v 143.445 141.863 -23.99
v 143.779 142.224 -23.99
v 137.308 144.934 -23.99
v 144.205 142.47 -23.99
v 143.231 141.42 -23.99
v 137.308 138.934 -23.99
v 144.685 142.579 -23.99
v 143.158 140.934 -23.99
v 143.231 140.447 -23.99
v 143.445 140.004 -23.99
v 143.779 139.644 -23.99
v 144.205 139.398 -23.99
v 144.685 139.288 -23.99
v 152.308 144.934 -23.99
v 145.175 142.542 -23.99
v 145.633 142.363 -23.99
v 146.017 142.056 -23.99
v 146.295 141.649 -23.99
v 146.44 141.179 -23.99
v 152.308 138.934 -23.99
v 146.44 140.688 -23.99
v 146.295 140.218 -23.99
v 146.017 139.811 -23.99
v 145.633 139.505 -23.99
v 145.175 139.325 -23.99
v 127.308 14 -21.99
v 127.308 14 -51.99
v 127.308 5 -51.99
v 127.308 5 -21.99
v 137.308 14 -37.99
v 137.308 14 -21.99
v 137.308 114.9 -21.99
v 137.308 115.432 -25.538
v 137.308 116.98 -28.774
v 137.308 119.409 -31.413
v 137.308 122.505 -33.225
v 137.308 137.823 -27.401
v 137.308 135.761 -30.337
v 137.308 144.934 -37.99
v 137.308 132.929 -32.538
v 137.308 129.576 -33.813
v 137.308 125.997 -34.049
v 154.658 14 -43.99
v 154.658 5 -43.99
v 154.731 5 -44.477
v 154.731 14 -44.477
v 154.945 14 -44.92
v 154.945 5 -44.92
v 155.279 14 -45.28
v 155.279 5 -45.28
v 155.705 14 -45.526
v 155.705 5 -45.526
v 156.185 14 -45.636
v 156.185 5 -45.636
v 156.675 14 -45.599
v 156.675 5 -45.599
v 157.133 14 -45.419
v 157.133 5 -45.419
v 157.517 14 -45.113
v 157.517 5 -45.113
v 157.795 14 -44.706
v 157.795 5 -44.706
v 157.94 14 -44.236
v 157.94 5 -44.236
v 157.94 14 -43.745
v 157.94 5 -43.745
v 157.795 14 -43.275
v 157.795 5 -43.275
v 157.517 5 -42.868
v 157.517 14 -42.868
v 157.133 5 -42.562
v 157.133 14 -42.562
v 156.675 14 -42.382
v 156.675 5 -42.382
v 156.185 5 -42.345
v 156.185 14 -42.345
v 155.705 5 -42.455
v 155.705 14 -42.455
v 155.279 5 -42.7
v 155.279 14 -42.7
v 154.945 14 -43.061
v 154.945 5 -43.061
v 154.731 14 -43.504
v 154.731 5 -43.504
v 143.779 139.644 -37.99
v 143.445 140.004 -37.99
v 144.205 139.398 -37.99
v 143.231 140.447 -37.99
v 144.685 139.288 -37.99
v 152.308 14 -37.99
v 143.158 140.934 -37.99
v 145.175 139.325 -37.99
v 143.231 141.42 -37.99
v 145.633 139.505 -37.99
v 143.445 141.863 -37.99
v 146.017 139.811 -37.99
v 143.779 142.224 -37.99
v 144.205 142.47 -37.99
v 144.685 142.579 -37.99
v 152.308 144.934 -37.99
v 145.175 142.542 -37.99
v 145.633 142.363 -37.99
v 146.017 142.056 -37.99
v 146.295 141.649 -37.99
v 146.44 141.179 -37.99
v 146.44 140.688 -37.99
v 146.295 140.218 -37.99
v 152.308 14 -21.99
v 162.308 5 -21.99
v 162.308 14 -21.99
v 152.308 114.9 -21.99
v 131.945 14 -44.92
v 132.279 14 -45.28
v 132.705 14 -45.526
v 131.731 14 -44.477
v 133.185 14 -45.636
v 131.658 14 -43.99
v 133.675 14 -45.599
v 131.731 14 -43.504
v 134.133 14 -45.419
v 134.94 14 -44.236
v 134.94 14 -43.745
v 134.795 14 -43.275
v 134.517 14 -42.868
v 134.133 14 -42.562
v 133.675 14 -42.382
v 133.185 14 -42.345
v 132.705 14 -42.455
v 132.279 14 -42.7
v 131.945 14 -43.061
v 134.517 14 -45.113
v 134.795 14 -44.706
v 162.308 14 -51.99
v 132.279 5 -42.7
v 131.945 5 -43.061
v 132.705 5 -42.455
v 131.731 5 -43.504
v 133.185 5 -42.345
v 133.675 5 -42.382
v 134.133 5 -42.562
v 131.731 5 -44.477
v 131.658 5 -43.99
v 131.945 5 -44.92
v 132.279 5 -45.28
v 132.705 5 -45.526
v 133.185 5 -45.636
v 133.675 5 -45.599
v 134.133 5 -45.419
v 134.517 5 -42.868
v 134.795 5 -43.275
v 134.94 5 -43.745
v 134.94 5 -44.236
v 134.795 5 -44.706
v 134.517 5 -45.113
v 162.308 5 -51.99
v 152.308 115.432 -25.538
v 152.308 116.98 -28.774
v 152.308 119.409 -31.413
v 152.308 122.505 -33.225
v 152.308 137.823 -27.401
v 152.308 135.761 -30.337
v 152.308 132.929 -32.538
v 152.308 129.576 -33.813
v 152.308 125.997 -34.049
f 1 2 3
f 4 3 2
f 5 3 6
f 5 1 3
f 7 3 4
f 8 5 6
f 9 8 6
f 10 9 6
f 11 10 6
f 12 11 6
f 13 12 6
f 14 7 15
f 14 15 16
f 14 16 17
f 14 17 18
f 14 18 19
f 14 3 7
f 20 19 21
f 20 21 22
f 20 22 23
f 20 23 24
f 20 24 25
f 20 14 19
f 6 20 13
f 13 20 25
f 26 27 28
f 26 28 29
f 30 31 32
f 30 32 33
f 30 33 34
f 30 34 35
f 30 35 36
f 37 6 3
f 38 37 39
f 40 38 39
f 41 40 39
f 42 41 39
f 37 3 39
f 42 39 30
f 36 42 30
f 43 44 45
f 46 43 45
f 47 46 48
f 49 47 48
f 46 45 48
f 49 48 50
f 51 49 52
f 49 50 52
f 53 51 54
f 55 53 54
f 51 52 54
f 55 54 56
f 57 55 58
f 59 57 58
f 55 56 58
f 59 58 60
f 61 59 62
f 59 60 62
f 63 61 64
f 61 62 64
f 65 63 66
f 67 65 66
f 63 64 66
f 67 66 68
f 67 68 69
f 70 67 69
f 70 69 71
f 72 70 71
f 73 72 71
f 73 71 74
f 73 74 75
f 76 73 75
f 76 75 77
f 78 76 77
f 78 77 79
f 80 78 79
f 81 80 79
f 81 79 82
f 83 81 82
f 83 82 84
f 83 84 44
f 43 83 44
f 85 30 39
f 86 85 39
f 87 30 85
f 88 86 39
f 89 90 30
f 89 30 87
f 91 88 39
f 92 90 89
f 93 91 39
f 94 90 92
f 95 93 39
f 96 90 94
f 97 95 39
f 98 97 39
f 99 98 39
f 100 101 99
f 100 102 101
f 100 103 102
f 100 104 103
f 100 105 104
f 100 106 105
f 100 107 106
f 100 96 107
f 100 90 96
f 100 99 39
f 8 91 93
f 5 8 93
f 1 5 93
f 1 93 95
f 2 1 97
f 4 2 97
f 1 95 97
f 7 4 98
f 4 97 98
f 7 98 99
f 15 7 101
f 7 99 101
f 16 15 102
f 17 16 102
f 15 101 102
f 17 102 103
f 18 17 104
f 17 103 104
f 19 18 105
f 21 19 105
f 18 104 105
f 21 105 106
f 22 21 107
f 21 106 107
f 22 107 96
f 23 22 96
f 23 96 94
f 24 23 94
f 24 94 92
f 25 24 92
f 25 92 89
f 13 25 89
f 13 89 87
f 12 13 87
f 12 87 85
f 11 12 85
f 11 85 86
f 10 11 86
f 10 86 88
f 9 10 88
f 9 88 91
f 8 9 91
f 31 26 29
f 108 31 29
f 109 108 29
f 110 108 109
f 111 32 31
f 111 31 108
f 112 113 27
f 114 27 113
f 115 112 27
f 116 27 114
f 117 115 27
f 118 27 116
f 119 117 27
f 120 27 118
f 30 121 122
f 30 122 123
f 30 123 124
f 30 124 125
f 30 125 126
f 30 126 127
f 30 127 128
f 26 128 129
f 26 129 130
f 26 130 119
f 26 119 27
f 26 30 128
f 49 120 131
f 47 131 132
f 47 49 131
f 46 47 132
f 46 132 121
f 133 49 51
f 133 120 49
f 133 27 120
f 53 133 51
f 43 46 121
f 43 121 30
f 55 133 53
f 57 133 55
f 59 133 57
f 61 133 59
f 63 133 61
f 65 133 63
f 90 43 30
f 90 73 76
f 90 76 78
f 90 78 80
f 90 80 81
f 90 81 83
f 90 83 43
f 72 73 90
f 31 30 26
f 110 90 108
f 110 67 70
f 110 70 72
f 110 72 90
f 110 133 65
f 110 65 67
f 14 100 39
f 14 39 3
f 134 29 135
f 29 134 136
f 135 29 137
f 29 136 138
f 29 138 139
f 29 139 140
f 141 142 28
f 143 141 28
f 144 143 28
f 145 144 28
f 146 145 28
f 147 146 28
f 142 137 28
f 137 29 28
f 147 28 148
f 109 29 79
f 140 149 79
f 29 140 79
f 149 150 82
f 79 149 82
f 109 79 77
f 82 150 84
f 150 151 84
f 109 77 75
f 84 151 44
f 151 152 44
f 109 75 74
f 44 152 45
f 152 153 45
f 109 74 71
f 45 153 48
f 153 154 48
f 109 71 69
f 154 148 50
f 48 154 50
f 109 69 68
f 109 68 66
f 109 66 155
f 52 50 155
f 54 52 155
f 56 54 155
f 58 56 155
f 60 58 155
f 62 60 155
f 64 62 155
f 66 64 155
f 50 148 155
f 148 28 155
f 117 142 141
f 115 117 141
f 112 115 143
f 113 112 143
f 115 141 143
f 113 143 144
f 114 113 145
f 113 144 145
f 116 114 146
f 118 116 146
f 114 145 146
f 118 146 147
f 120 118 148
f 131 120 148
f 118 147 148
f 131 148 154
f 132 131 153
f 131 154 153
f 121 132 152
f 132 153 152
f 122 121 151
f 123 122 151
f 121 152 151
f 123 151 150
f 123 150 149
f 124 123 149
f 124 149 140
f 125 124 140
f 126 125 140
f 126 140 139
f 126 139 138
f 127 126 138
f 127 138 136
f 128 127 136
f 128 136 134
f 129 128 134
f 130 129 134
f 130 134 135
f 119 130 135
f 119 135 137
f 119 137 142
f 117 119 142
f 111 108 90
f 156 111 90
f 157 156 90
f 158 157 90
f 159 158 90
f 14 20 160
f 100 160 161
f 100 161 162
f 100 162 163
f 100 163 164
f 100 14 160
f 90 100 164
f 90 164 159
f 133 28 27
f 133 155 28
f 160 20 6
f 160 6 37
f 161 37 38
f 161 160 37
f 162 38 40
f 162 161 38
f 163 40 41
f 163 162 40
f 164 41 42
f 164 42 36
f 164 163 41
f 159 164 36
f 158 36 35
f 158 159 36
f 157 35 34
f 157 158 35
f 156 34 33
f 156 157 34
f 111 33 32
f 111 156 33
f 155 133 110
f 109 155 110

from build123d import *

# Parameters (mm, degrees)
SKETCH_2_W                 = 240.549430728
SKETCH_2_H                 = 149.540933388
EXTRUDE_1_DEPTH            = 5
SKETCH_6_W                 = 93.246571425
SKETCH_6_H                 = 149.540933388
EXTRUDE_4_DEPTH            = 5
SKETCH_8_W                 = 274.716709757
SKETCH_8_H                 = 58.51354913
EXTRUDE_6_DEPTH            = 5
CUT_EXTRUDE_2_DEPTH        = 252.755772101
CUT_EXTRUDE_2_DEPTH_BACK   = 252.755772101
SKETCH_9_W                 = 59.079292396
SKETCH_9_H                 = 149.540933388
SKETCH_10_W                = 104.703380117
SKETCH_10_H                = 208.054482518
CUT_EXTRUDE_3_DEPTH        = 10
SKETCH_12_W                = 200
SKETCH_12_H                = 200
EXTRUDE_7_DEPTH            = 5
SKETCH_13_OUTSIDE_W        = 259.728
SKETCH_13_OUTSIDE_H        = 267.782
SKETCH_13_OUTSIDE_W_2      = 200
SKETCH_13_OUTSIDE_H_2      = 200
CUT_EXTRUDE_4_DEPTH        = 278.64321362
EXTRUDE_START              = -75
SKETCH_18_R                = 5.25
EXTRUDE_9_DEPTH            = 10
EXTRUDE_START_2            = -46
EXTRUDE_10_DEPTH           = 15
EXTRUDE_START_3            = -91.2
EXTRUDE_11_DEPTH           = 15
EXTRUDE_12_REACH           = 307.894
SKETCH_20_R                = 5.25
SKETCH_26_W                = 200
SKETCH_26_H                = 5
EXTRUDE_13_DEPTH           = 100
SKETCH_27_W                = 200
SKETCH_27_H                = 5
CUT_EXTRUDE_5_DEPTH        = 30
EXTRUDE_14_DEPTH           = 10
SKETCH_29_W                = 60
SKETCH_29_H                = 9
EXTRUDE_15_DEPTH           = 10
HOLE_WIZARD_M4_1_D         = 3.3
HOLE_WIZARD_M4_2_D         = 3.3
HOLE_WIZARD_M4_3_D         = 3.3
EXTRUDE_16_DEPTH           = 10
SKETCH_37_W                = 60
SKETCH_37_H                = 9
EXTRUDE_17_DEPTH           = 10
HOLE_WIZARD_M4_4_D         = 3.3
EXTRUDE_START_4            = -3.5
SKETCH_40_R                = 5.25
SKETCH_40_R_2              = 3.25
EXTRUDE_18_DEPTH           = 46.5
CUT_EXTRUDE_START          = -3.5
SKETCH_41_R                = 5.25
SKETCH_41_R_2              = 3.25
CUT_EXTRUDE_6_DEPTH        = 3.5
HOLE_WIZARD_M4_5_OUTLINE_R = 1.65
HOLE_WIZARD_M4_5_DEPTH     = 14
CUT_EXTRUDE_7_DEPTH        = 400.170489639
CUT_EXTRUDE_7_DEPTH_BACK   = 400.170489639
SKETCH_44_W                = 15
SKETCH_44_H                = 131.085631965
SKETCH_44_W_2              = 270
SKETCH_44_H_2              = 5
CUT_EXTRUDE_START_2        = -16
CUT_EXTRUDE_8_DEPTH        = 30


# Read off the part's stored shape, not the designer's step: M4 螺纹孔5
with BuildPart() as part:
    # 草图2 → 凸台-拉伸1 (new body)
    with BuildSketch(Plane(origin=(0, 0, 0), x_dir=(1, 0, 0), z_dir=(0, 1, 0))):
        Rectangle(SKETCH_2_W, SKETCH_2_H)
    extrude(amount=EXTRUDE_1_DEPTH)

    # 草图6 → 凸台-拉伸4 (add)
    with BuildSketch(Plane(origin=(0, 5, 0), x_dir=(1, 0, 0), z_dir=(0, 1, 0))):
        with Locations((166.898001077, 0)):
            Rectangle(SKETCH_6_W, SKETCH_6_H)
    extrude(amount=-EXTRUDE_4_DEPTH)

    # 草图8 → 凸台-拉伸6 (add)
    with BuildSketch(Plane(origin=(0, 5, 0), x_dir=(1, 0, 0), z_dir=(0, 1, 0))):
        with Locations((76.162931911, -104.027241259)):
            Rectangle(SKETCH_8_W, SKETCH_8_H)
    extrude(amount=-EXTRUDE_6_DEPTH)

    # 草图9 → 切除-拉伸2 (cut, two sides: drawn at the far end of the back side and taken through both)
    with BuildSketch(Plane(origin=(0, 5, 0), x_dir=(1, 0, 0), z_dir=(0, 1, 0)).offset(-CUT_EXTRUDE_2_DEPTH_BACK)):
        with Locations((-90.735069166, 0)):
            Rectangle(SKETCH_9_W, SKETCH_9_H)
    extrude(amount=CUT_EXTRUDE_2_DEPTH + CUT_EXTRUDE_2_DEPTH_BACK, mode=Mode.SUBTRACT)

    # 草图10 → 切除-拉伸3 (cut)
    with BuildSketch(Plane(origin=(0, 5, 0), x_dir=(1, 0, 0), z_dir=(0, 1, 0))):
        with Locations((-8.84373291, -29.256774565)):
            Rectangle(SKETCH_10_W, SKETCH_10_H)
    extrude(amount=-CUT_EXTRUDE_3_DEPTH, mode=Mode.SUBTRACT)

    # 草图12 → 凸台-拉伸7 (add)
    with BuildSketch(Plane(origin=(0, 5, 0), x_dir=(1, 0, 0), z_dir=(0, 1, 0))):
        with Locations((143.507957149, -25.229533306)):
            Rectangle(SKETCH_12_W, SKETCH_12_H)
    extrude(amount=-EXTRUDE_7_DEPTH)

    # 草图13 outside → 切除-拉伸4 (cut, through all)
    with BuildSketch(Plane(origin=(0, 5, 0), x_dir=(1, 0, 0), z_dir=(0, 1, 0))):
        with Locations((143.508, -29.257)):
            Rectangle(SKETCH_13_OUTSIDE_W, SKETCH_13_OUTSIDE_H)
        with Locations((143.507957149, -25.229533306)):
            Rectangle(SKETCH_13_OUTSIDE_W_2, SKETCH_13_OUTSIDE_H_2, mode=Mode.SUBTRACT)
    extrude(amount=-CUT_EXTRUDE_4_DEPTH, mode=Mode.SUBTRACT)

    # 草图18 → 凸台-拉伸9 (add)
    with BuildSketch(Plane.XY.offset(125.229533306).offset(EXTRUDE_START)):
        with BuildLine():
            Line((95.507957149, 14), (95.507957149, 125))
            ThreePointArc((95.507957149, 125), (88.507957149, 132), (81.507957149, 125))
            Line((81.507957149, 125), (81.507957149, 14))
            Line((81.507957149, 14), (68.507957149, 14))
            Line((68.507957149, 14), (68.507957149, 5))
            Line((68.507957149, 5), (108.507957149, 5))
            Line((108.507957149, 5), (108.507957149, 14))
            Line((108.507957149, 14), (95.507957149, 14))
        make_face()
        with Locations((88.507957149, 125)):
            Circle(SKETCH_18_R, mode=Mode.SUBTRACT)
    extrude_9 = extrude(amount=-EXTRUDE_9_DEPTH)

    # 镜向1: 凸台-拉伸9 across plane
    add(extrude_9.mirror(Plane.XY.offset(25.229533306)))

    # 草图16 → 凸台-拉伸10 (add)
    with BuildSketch(Plane(origin=(243.507957149, 0, 0), x_dir=(0, 0, -1), z_dir=(1, 0, 0)).offset(EXTRUDE_START_2)):
        with BuildLine():
            Line((-53.779533306, 14), (-53.779533306, 145.085631965))
            Line((-53.779533306, 145.085631965), (-67.779533306, 145.085631965))
            Line((-67.779533306, 145.085631965), (-67.779533306, 139.085631965))
            ThreePointArc((-67.779533306, 139.085631965), (-69.779533306, 114.75), (-71.779533306, 139.085631965))
            Line((-71.779533306, 139.085631965), (-71.779533306, 145.085631965))
            Line((-71.779533306, 145.085631965), (-85.779533306, 145.085631965))
            Line((-85.779533306, 145.085631965), (-85.779533306, 14))
            Line((-85.779533306, 14), (-99.779533306, 14))
            Line((-99.779533306, 14), (-99.779533306, 5))
            Line((-99.779533306, 5), (-39.779533306, 5))
            Line((-39.779533306, 5), (-39.779533306, 14))
            Line((-39.779533306, 14), (-53.779533306, 14))
        make_face()
    extrude(amount=-EXTRUDE_10_DEPTH)

    # 草图19 → 凸台-拉伸11 (add)
    with BuildSketch(Plane(origin=(243.507957149, 0, 0), x_dir=(0, 0, -1), z_dir=(1, 0, 0)).offset(EXTRUDE_START_3)):
        with BuildLine():
            Line((37.990466694, 14), (37.990466694, 144.933566106))
            Line((37.990466694, 144.933566106), (23.990466694, 144.933566106))
            Line((23.990466694, 144.933566106), (23.990466694, 138.933566106))
            ThreePointArc((23.990466694, 138.933566106), (21.990466694, 114.9), (19.990466694, 138.933566106))
            Line((19.990466694, 138.933566106), (19.990466694, 144.933566106))
            Line((19.990466694, 144.933566106), (5.990466694, 144.933566106))
            Line((5.990466694, 144.933566106), (5.990466694, 14))
            Line((5.990466694, 14), (-8.009533306, 14))
            Line((-8.009533306, 14), (-8.009533306, 5))
            Line((-8.009533306, 5), (51.990466694, 5))
            Line((51.990466694, 5), (51.990466694, 14))
            Line((51.990466694, 14), (37.990466694, 14))
        make_face()
    extrude(amount=-EXTRUDE_11_DEPTH)

    # 草图20 → 凸台-拉伸12 (add, up to next)
    with BuildSketch(Plane(origin=(0, 0, 40.229533306), x_dir=(-1, 0, 0), z_dir=(0, 0, -1)), mode=Mode.PRIVATE) as extrude_12_sk1:
        with BuildLine():
            Line((-108.507957149, 5), (-68.507957149, 5))
            Line((-68.507957149, 5), (-68.507957149, 14))
            Line((-68.507957149, 14), (-81.507957149, 14))
            Line((-81.507957149, 14), (-81.507957149, 125))
            ThreePointArc((-81.507957149, 125), (-88.507957149, 132), (-95.507957149, 125))
            Line((-95.507957149, 125), (-95.507957149, 14))
            Line((-95.507957149, 14), (-108.507957149, 14))
            Line((-108.507957149, 14), (-108.507957149, 5))
        make_face()
        with Locations(Location((-88.507957149, 125, 0), (0, 0, 180))):
            Circle(SKETCH_20_R, mode=Mode.SUBTRACT)
    extrude_12_tool1 = extrude(extrude_12_sk1.sketch, amount=EXTRUDE_12_REACH, mode=Mode.PRIVATE) - part.part
    add(extrude_12_tool1.solids().sort_by_distance((88.507957, 57.997401, 40.229533))[0])

    # 草图26 → 凸台-拉伸13 (add)
    with BuildSketch(Plane(origin=(243.507957149, 0, 0), x_dir=(0, 0, -1), z_dir=(1, 0, 0))):
        with Locations((-25.229533306, 2.5)):
            Rectangle(SKETCH_26_W, SKETCH_26_H)
    extrude(amount=EXTRUDE_13_DEPTH)

    # 草图27 → 切除-拉伸5 (cut)
    with BuildSketch(Plane(origin=(343.507957149, 0, 0), x_dir=(0, 0, -1), z_dir=(1, 0, 0))):
        with Locations((-25.229533306, 2.5)):
            Rectangle(SKETCH_27_W, SKETCH_27_H)
    extrude(amount=-CUT_EXTRUDE_5_DEPTH, mode=Mode.SUBTRACT)

    # 草图28 → 凸台-拉伸14 (add)
    with BuildSketch(Plane(origin=(197.507957149, 0, 0), x_dir=(0, 0, -1), z_dir=(1, 0, 0))):
        Polygon((-85.779533306, 14), (-53.779533306, 14), (-39.779533306, 14), (-39.779533306, 5), (-99.779533306, 5), (-99.779533306, 14), align=None)
    extrude(amount=EXTRUDE_14_DEPTH)

    # 草图29 → 凸台-拉伸15 (add)
    with BuildSketch(Plane.ZY.offset(-182.507957149)):
        with Locations((69.779533306, 9.5)):
            Rectangle(SKETCH_29_W, SKETCH_29_H)
    extrude(amount=EXTRUDE_15_DEPTH)

    # M4 螺纹孔1 (through all)
    with Locations(Plane(origin=(0, 14, 0), x_dir=(1, 0, 0), z_dir=(0, 1, 0))):
        with Locations((178.507957149, -47.779533306), (201.507957149, -47.779533306), (201.507957149, -91.779533306), (178.507957149, -91.779533306)):
            Hole(HOLE_WIZARD_M4_1_D / 2)

    # M4 螺纹孔2 (through all)
    with Locations(Plane.XY.offset(85.779533306)):
        with Locations((190.007957149, 141.085631965)):
            Hole(HOLE_WIZARD_M4_2_D / 2)

    # M4 螺纹孔3 (through all)
    with Locations(Plane.XY.offset(-5.990466694)):
        with Locations((144.807957149, 140.933566106)):
            Hole(HOLE_WIZARD_M4_3_D / 2)

    # 草图36 → 凸台-拉伸16 (add)
    with BuildSketch(Plane(origin=(152.307957149, 0, 0), x_dir=(0, 0, -1), z_dir=(1, 0, 0))):
        Polygon((5.990466694, 14), (37.990466694, 14), (51.990466694, 14), (51.990466694, 5), (-8.009533306, 5), (-8.009533306, 14), align=None)
    extrude(amount=EXTRUDE_16_DEPTH)

    # 草图37 → 凸台-拉伸17 (add)
    with BuildSketch(Plane.ZY.offset(-137.307957149)):
        with Locations((-21.990466694, 9.5)):
            Rectangle(SKETCH_37_W, SKETCH_37_H)
    extrude(amount=EXTRUDE_17_DEPTH)

    # M4 螺纹孔4 (through all)
    with Locations(Plane(origin=(0, 14, 0), x_dir=(1, 0, 0), z_dir=(0, 1, 0))):
        with Locations((133.307957149, 43.990466694), (156.307957149, 43.990466694), (156.307957149, -0.009533306), (133.307957149, -0.009533306)):
            Hole(HOLE_WIZARD_M4_4_D / 2)

    # 草图40 → 凸台-拉伸18 (add)
    with BuildSketch(Plane.XY.offset(50.229533306).offset(EXTRUDE_START_4)):
        with Locations((88.507957149, 125)):
            Circle(SKETCH_40_R)
        with Locations((88.507957149, 125)):
            Circle(SKETCH_40_R_2, mode=Mode.SUBTRACT)
    extrude(amount=-EXTRUDE_18_DEPTH)

    # 草图41 → 切除-拉伸6 (cut)
    with BuildSketch(Plane(origin=(0, 0, 0.229533306), x_dir=(-1, 0, 0), z_dir=(0, 0, -1)).offset(CUT_EXTRUDE_START)):
        with Locations(Location((-88.507957149, 125, 0), (0, 0, 180))):
            Circle(SKETCH_41_R)
        with Locations(Location((-88.507957149, 125, 0), (0, 0, 180))):
            Circle(SKETCH_41_R_2, mode=Mode.SUBTRACT)
    extrude(amount=CUT_EXTRUDE_6_DEPTH, mode=Mode.SUBTRACT)

    # M4 螺纹孔5 outline → M4 螺纹孔5 (cut)
    with BuildSketch(Plane(origin=(0, 0, 0), x_dir=(1, 0, 0), z_dir=(0, 1, 0))):
        with Locations((73.507957149, -42.229533306)):
            Circle(HOLE_WIZARD_M4_5_OUTLINE_R)
        with Locations((103.507957149, -42.229533306)):
            Circle(HOLE_WIZARD_M4_5_OUTLINE_R)
        with Locations((103.507957149, -8.229533306)):
            Circle(HOLE_WIZARD_M4_5_OUTLINE_R)
        with Locations((73.507957149, -8.229533306)):
            Circle(HOLE_WIZARD_M4_5_OUTLINE_R)
    extrude(amount=HOLE_WIZARD_M4_5_DEPTH, mode=Mode.SUBTRACT)

    # 草图44 → 切除-拉伸7 (cut, two sides: drawn at the far end of the back side and taken through both)
    with BuildSketch(Plane.XY.offset(125.229533306).offset(-CUT_EXTRUDE_7_DEPTH_BACK)):
        with Locations((190.007957149, 79.542815983)):
            Rectangle(SKETCH_44_W, SKETCH_44_H)
        Polygon((172.507957149, 14), (172.507957149, 5), (207.507957149, 5), (207.507957149, 14), (197.507957149, 14), (182.507957149, 14), align=None)
        with BuildLine():
            Line((68.507957149, 5), (108.507957149, 5))
            Line((108.507957149, 5), (108.507957149, 14))
            Line((108.507957149, 14), (95.507957149, 14))
            Line((95.507957149, 14), (95.507957149, 125))
            ThreePointArc((95.507957149, 125), (88.507957149, 132), (81.507957149, 125))
            Line((81.507957149, 125), (81.507957149, 14))
            Line((81.507957149, 14), (68.507957149, 14))
            Line((68.507957149, 14), (68.507957149, 5))
        make_face()
        with Locations((178.507957149, 2.5)):
            Rectangle(SKETCH_44_W_2, SKETCH_44_H_2)
    extrude(amount=CUT_EXTRUDE_7_DEPTH + CUT_EXTRUDE_7_DEPTH_BACK, mode=Mode.SUBTRACT)

    # 草图45 → 切除-拉伸8 (cut)
    with BuildSketch(Plane.XY.offset(-5.990466694).offset(CUT_EXTRUDE_START_2)):
        Polygon((137.307957149, 14), (127.307957149, 14), (127.307957149, 5), (162.307957149, 5), (162.307957149, 14), (152.307957149, 14), (152.307957149, 144.933566106), (137.307957149, 144.933566106), align=None)
    extrude(amount=CUT_EXTRUDE_8_DEPTH, mode=Mode.SUBTRACT)


solid = part.part
